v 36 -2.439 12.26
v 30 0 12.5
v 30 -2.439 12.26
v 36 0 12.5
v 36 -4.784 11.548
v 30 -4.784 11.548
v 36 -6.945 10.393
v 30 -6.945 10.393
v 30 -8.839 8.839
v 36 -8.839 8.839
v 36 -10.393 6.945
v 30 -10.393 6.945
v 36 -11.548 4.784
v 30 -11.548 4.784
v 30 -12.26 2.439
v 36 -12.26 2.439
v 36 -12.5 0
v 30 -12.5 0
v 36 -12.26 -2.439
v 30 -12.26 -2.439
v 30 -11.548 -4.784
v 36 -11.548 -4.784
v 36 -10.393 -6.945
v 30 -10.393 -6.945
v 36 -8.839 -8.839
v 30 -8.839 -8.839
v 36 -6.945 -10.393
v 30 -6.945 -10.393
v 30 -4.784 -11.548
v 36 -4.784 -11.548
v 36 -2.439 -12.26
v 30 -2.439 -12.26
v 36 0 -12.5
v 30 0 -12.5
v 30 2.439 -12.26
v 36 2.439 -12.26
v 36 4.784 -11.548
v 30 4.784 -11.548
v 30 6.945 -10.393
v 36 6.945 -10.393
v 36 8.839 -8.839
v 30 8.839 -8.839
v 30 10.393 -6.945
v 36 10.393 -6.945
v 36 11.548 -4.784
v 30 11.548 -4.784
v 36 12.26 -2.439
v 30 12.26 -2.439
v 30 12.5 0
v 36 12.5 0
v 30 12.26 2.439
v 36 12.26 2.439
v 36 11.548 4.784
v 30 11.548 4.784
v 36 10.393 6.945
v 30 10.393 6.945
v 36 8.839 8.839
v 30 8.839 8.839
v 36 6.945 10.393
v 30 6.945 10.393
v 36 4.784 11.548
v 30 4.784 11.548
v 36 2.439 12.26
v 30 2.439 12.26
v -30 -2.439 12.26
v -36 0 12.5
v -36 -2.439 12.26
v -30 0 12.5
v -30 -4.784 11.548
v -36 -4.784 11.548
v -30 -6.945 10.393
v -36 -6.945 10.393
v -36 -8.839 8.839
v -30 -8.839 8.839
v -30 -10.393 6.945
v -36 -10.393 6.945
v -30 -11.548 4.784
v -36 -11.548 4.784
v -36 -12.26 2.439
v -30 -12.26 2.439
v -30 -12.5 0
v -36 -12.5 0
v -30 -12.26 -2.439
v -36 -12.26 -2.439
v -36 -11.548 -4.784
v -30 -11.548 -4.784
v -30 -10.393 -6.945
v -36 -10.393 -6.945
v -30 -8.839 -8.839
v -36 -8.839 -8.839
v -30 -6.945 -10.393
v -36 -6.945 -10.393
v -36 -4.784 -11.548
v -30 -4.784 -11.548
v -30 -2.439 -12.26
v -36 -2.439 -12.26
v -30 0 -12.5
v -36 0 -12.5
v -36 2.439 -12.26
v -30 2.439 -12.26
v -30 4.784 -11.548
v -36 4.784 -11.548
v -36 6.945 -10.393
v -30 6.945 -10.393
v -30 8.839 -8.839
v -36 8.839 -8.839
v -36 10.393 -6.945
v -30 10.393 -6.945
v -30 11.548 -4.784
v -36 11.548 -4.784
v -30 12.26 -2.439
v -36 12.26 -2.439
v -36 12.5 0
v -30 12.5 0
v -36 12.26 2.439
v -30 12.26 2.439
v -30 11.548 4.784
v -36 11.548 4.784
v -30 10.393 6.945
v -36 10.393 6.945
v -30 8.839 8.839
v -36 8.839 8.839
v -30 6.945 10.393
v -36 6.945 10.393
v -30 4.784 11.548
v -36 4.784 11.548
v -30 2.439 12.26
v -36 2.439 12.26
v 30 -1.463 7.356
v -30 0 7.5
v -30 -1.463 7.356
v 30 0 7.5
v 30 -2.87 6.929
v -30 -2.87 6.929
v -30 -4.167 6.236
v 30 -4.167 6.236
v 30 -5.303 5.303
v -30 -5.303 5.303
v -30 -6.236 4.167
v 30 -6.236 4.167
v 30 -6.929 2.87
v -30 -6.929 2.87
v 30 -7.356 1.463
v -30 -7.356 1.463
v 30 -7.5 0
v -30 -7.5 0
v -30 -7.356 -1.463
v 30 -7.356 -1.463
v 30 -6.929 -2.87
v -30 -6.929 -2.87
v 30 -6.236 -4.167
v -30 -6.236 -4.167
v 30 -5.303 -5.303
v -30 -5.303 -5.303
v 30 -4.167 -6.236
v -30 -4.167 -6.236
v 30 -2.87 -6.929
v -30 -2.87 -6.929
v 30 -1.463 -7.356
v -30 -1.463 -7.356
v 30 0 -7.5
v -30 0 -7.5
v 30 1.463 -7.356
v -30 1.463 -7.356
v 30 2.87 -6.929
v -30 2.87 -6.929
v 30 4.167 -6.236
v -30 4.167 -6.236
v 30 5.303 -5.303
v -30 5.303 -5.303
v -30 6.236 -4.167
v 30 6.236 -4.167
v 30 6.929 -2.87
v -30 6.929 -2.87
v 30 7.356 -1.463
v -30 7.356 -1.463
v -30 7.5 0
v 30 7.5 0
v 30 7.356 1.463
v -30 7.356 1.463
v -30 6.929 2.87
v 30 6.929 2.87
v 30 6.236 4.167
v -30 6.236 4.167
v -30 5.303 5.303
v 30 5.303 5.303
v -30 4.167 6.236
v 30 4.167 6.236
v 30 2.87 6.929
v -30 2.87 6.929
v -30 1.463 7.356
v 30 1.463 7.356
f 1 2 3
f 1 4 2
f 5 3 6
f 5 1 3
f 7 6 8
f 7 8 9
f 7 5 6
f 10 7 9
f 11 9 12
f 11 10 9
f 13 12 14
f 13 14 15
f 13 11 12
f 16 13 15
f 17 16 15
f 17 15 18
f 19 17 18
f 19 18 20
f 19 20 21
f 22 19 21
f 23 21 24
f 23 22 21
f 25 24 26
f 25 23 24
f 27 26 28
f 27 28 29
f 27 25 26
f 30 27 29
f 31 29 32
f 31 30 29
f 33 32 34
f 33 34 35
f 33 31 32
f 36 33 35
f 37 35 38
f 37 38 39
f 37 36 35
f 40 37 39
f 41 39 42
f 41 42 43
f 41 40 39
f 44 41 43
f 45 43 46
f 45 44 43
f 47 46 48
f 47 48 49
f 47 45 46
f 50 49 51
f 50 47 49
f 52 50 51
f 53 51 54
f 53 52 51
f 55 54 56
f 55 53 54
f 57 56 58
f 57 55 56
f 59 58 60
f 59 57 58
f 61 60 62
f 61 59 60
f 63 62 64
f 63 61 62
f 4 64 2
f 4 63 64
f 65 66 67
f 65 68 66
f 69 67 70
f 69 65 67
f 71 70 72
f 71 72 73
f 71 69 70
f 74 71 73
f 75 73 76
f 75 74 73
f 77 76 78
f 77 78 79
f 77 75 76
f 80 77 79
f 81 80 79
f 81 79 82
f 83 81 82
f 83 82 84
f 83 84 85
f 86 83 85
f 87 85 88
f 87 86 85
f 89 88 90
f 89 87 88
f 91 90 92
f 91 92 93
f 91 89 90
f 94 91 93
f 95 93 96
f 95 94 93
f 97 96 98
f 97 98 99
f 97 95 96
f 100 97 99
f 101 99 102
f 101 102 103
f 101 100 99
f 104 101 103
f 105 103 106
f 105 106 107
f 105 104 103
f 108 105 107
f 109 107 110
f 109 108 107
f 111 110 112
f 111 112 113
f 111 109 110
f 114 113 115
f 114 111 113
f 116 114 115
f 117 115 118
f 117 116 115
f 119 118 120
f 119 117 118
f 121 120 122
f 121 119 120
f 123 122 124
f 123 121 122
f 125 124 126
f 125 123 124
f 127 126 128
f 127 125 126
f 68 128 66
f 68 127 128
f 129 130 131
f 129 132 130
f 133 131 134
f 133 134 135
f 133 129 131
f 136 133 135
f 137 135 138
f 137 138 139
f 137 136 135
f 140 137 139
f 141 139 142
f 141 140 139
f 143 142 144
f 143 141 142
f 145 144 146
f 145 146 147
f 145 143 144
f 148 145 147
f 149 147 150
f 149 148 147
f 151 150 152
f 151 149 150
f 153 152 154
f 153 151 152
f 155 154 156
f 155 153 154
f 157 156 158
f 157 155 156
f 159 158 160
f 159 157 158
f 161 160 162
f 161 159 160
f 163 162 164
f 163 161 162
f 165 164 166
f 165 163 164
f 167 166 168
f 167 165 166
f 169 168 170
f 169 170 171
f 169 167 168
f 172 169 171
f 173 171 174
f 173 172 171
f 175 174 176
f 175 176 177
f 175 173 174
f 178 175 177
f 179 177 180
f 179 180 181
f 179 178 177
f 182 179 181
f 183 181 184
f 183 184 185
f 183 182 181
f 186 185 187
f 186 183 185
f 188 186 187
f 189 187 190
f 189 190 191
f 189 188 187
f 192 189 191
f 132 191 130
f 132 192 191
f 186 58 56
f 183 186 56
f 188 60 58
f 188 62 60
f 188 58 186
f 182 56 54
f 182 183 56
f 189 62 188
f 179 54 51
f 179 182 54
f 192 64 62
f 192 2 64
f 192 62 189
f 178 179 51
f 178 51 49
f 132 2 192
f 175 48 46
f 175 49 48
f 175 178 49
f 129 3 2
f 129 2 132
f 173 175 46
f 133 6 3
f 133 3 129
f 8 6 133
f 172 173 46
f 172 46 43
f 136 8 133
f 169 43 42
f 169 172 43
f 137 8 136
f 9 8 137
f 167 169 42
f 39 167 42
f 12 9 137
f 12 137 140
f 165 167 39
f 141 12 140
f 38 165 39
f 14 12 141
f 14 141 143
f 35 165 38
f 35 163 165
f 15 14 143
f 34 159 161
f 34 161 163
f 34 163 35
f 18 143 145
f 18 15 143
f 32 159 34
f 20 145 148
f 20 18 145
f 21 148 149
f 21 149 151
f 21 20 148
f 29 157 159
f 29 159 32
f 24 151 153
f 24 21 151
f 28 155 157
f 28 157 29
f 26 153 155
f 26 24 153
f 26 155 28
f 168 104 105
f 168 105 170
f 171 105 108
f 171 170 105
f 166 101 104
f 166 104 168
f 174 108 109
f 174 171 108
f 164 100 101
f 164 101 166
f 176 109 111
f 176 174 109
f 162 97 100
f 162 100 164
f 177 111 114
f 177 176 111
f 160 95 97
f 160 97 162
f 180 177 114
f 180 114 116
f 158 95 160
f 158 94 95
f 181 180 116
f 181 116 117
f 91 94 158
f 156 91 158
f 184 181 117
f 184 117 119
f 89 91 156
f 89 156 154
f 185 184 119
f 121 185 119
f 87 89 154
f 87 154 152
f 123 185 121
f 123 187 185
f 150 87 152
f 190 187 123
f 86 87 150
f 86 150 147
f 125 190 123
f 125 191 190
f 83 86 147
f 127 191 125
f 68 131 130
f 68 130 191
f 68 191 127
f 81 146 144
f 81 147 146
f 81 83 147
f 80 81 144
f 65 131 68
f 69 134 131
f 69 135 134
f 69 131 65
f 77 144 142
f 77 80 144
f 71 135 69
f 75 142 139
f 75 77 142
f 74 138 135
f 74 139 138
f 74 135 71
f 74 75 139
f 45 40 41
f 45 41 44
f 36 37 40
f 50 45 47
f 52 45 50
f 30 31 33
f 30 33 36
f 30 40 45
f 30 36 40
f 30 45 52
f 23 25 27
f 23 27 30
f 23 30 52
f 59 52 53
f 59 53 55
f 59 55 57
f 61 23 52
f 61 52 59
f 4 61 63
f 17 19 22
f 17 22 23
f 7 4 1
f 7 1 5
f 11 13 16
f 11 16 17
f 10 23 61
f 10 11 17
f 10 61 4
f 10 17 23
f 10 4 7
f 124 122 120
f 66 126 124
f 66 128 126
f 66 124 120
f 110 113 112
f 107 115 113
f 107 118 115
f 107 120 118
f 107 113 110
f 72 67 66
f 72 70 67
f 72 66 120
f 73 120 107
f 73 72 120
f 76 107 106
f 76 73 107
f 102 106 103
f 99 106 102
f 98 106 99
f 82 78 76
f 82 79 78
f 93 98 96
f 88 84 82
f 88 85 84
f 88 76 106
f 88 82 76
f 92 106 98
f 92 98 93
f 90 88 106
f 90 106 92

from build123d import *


with BuildPart() as part:
    # Sketch1 → Revolve1 (revolve)
    with BuildSketch(Plane(origin=(0, 0, 0), x_dir=(1, 0, 0), z_dir=(0, 1, 0)), mode=Mode.PRIVATE) as revolve1_sk:
        Polygon((0, 0), (-36, 0), (-36, 12.5), (-30, 12.5), (-30, 7.5), (30, 7.5), (30, 12.5), (36, 12.5), (36, 0), align=None)
    revolve(revolve1_sk.sketch.rotate(Axis((-414.016836438, 0, 0), (1, 0, 0)), 180), axis=Axis((-414.016836438, 0, 0), (1, 0, 0)))


solid = part.part
